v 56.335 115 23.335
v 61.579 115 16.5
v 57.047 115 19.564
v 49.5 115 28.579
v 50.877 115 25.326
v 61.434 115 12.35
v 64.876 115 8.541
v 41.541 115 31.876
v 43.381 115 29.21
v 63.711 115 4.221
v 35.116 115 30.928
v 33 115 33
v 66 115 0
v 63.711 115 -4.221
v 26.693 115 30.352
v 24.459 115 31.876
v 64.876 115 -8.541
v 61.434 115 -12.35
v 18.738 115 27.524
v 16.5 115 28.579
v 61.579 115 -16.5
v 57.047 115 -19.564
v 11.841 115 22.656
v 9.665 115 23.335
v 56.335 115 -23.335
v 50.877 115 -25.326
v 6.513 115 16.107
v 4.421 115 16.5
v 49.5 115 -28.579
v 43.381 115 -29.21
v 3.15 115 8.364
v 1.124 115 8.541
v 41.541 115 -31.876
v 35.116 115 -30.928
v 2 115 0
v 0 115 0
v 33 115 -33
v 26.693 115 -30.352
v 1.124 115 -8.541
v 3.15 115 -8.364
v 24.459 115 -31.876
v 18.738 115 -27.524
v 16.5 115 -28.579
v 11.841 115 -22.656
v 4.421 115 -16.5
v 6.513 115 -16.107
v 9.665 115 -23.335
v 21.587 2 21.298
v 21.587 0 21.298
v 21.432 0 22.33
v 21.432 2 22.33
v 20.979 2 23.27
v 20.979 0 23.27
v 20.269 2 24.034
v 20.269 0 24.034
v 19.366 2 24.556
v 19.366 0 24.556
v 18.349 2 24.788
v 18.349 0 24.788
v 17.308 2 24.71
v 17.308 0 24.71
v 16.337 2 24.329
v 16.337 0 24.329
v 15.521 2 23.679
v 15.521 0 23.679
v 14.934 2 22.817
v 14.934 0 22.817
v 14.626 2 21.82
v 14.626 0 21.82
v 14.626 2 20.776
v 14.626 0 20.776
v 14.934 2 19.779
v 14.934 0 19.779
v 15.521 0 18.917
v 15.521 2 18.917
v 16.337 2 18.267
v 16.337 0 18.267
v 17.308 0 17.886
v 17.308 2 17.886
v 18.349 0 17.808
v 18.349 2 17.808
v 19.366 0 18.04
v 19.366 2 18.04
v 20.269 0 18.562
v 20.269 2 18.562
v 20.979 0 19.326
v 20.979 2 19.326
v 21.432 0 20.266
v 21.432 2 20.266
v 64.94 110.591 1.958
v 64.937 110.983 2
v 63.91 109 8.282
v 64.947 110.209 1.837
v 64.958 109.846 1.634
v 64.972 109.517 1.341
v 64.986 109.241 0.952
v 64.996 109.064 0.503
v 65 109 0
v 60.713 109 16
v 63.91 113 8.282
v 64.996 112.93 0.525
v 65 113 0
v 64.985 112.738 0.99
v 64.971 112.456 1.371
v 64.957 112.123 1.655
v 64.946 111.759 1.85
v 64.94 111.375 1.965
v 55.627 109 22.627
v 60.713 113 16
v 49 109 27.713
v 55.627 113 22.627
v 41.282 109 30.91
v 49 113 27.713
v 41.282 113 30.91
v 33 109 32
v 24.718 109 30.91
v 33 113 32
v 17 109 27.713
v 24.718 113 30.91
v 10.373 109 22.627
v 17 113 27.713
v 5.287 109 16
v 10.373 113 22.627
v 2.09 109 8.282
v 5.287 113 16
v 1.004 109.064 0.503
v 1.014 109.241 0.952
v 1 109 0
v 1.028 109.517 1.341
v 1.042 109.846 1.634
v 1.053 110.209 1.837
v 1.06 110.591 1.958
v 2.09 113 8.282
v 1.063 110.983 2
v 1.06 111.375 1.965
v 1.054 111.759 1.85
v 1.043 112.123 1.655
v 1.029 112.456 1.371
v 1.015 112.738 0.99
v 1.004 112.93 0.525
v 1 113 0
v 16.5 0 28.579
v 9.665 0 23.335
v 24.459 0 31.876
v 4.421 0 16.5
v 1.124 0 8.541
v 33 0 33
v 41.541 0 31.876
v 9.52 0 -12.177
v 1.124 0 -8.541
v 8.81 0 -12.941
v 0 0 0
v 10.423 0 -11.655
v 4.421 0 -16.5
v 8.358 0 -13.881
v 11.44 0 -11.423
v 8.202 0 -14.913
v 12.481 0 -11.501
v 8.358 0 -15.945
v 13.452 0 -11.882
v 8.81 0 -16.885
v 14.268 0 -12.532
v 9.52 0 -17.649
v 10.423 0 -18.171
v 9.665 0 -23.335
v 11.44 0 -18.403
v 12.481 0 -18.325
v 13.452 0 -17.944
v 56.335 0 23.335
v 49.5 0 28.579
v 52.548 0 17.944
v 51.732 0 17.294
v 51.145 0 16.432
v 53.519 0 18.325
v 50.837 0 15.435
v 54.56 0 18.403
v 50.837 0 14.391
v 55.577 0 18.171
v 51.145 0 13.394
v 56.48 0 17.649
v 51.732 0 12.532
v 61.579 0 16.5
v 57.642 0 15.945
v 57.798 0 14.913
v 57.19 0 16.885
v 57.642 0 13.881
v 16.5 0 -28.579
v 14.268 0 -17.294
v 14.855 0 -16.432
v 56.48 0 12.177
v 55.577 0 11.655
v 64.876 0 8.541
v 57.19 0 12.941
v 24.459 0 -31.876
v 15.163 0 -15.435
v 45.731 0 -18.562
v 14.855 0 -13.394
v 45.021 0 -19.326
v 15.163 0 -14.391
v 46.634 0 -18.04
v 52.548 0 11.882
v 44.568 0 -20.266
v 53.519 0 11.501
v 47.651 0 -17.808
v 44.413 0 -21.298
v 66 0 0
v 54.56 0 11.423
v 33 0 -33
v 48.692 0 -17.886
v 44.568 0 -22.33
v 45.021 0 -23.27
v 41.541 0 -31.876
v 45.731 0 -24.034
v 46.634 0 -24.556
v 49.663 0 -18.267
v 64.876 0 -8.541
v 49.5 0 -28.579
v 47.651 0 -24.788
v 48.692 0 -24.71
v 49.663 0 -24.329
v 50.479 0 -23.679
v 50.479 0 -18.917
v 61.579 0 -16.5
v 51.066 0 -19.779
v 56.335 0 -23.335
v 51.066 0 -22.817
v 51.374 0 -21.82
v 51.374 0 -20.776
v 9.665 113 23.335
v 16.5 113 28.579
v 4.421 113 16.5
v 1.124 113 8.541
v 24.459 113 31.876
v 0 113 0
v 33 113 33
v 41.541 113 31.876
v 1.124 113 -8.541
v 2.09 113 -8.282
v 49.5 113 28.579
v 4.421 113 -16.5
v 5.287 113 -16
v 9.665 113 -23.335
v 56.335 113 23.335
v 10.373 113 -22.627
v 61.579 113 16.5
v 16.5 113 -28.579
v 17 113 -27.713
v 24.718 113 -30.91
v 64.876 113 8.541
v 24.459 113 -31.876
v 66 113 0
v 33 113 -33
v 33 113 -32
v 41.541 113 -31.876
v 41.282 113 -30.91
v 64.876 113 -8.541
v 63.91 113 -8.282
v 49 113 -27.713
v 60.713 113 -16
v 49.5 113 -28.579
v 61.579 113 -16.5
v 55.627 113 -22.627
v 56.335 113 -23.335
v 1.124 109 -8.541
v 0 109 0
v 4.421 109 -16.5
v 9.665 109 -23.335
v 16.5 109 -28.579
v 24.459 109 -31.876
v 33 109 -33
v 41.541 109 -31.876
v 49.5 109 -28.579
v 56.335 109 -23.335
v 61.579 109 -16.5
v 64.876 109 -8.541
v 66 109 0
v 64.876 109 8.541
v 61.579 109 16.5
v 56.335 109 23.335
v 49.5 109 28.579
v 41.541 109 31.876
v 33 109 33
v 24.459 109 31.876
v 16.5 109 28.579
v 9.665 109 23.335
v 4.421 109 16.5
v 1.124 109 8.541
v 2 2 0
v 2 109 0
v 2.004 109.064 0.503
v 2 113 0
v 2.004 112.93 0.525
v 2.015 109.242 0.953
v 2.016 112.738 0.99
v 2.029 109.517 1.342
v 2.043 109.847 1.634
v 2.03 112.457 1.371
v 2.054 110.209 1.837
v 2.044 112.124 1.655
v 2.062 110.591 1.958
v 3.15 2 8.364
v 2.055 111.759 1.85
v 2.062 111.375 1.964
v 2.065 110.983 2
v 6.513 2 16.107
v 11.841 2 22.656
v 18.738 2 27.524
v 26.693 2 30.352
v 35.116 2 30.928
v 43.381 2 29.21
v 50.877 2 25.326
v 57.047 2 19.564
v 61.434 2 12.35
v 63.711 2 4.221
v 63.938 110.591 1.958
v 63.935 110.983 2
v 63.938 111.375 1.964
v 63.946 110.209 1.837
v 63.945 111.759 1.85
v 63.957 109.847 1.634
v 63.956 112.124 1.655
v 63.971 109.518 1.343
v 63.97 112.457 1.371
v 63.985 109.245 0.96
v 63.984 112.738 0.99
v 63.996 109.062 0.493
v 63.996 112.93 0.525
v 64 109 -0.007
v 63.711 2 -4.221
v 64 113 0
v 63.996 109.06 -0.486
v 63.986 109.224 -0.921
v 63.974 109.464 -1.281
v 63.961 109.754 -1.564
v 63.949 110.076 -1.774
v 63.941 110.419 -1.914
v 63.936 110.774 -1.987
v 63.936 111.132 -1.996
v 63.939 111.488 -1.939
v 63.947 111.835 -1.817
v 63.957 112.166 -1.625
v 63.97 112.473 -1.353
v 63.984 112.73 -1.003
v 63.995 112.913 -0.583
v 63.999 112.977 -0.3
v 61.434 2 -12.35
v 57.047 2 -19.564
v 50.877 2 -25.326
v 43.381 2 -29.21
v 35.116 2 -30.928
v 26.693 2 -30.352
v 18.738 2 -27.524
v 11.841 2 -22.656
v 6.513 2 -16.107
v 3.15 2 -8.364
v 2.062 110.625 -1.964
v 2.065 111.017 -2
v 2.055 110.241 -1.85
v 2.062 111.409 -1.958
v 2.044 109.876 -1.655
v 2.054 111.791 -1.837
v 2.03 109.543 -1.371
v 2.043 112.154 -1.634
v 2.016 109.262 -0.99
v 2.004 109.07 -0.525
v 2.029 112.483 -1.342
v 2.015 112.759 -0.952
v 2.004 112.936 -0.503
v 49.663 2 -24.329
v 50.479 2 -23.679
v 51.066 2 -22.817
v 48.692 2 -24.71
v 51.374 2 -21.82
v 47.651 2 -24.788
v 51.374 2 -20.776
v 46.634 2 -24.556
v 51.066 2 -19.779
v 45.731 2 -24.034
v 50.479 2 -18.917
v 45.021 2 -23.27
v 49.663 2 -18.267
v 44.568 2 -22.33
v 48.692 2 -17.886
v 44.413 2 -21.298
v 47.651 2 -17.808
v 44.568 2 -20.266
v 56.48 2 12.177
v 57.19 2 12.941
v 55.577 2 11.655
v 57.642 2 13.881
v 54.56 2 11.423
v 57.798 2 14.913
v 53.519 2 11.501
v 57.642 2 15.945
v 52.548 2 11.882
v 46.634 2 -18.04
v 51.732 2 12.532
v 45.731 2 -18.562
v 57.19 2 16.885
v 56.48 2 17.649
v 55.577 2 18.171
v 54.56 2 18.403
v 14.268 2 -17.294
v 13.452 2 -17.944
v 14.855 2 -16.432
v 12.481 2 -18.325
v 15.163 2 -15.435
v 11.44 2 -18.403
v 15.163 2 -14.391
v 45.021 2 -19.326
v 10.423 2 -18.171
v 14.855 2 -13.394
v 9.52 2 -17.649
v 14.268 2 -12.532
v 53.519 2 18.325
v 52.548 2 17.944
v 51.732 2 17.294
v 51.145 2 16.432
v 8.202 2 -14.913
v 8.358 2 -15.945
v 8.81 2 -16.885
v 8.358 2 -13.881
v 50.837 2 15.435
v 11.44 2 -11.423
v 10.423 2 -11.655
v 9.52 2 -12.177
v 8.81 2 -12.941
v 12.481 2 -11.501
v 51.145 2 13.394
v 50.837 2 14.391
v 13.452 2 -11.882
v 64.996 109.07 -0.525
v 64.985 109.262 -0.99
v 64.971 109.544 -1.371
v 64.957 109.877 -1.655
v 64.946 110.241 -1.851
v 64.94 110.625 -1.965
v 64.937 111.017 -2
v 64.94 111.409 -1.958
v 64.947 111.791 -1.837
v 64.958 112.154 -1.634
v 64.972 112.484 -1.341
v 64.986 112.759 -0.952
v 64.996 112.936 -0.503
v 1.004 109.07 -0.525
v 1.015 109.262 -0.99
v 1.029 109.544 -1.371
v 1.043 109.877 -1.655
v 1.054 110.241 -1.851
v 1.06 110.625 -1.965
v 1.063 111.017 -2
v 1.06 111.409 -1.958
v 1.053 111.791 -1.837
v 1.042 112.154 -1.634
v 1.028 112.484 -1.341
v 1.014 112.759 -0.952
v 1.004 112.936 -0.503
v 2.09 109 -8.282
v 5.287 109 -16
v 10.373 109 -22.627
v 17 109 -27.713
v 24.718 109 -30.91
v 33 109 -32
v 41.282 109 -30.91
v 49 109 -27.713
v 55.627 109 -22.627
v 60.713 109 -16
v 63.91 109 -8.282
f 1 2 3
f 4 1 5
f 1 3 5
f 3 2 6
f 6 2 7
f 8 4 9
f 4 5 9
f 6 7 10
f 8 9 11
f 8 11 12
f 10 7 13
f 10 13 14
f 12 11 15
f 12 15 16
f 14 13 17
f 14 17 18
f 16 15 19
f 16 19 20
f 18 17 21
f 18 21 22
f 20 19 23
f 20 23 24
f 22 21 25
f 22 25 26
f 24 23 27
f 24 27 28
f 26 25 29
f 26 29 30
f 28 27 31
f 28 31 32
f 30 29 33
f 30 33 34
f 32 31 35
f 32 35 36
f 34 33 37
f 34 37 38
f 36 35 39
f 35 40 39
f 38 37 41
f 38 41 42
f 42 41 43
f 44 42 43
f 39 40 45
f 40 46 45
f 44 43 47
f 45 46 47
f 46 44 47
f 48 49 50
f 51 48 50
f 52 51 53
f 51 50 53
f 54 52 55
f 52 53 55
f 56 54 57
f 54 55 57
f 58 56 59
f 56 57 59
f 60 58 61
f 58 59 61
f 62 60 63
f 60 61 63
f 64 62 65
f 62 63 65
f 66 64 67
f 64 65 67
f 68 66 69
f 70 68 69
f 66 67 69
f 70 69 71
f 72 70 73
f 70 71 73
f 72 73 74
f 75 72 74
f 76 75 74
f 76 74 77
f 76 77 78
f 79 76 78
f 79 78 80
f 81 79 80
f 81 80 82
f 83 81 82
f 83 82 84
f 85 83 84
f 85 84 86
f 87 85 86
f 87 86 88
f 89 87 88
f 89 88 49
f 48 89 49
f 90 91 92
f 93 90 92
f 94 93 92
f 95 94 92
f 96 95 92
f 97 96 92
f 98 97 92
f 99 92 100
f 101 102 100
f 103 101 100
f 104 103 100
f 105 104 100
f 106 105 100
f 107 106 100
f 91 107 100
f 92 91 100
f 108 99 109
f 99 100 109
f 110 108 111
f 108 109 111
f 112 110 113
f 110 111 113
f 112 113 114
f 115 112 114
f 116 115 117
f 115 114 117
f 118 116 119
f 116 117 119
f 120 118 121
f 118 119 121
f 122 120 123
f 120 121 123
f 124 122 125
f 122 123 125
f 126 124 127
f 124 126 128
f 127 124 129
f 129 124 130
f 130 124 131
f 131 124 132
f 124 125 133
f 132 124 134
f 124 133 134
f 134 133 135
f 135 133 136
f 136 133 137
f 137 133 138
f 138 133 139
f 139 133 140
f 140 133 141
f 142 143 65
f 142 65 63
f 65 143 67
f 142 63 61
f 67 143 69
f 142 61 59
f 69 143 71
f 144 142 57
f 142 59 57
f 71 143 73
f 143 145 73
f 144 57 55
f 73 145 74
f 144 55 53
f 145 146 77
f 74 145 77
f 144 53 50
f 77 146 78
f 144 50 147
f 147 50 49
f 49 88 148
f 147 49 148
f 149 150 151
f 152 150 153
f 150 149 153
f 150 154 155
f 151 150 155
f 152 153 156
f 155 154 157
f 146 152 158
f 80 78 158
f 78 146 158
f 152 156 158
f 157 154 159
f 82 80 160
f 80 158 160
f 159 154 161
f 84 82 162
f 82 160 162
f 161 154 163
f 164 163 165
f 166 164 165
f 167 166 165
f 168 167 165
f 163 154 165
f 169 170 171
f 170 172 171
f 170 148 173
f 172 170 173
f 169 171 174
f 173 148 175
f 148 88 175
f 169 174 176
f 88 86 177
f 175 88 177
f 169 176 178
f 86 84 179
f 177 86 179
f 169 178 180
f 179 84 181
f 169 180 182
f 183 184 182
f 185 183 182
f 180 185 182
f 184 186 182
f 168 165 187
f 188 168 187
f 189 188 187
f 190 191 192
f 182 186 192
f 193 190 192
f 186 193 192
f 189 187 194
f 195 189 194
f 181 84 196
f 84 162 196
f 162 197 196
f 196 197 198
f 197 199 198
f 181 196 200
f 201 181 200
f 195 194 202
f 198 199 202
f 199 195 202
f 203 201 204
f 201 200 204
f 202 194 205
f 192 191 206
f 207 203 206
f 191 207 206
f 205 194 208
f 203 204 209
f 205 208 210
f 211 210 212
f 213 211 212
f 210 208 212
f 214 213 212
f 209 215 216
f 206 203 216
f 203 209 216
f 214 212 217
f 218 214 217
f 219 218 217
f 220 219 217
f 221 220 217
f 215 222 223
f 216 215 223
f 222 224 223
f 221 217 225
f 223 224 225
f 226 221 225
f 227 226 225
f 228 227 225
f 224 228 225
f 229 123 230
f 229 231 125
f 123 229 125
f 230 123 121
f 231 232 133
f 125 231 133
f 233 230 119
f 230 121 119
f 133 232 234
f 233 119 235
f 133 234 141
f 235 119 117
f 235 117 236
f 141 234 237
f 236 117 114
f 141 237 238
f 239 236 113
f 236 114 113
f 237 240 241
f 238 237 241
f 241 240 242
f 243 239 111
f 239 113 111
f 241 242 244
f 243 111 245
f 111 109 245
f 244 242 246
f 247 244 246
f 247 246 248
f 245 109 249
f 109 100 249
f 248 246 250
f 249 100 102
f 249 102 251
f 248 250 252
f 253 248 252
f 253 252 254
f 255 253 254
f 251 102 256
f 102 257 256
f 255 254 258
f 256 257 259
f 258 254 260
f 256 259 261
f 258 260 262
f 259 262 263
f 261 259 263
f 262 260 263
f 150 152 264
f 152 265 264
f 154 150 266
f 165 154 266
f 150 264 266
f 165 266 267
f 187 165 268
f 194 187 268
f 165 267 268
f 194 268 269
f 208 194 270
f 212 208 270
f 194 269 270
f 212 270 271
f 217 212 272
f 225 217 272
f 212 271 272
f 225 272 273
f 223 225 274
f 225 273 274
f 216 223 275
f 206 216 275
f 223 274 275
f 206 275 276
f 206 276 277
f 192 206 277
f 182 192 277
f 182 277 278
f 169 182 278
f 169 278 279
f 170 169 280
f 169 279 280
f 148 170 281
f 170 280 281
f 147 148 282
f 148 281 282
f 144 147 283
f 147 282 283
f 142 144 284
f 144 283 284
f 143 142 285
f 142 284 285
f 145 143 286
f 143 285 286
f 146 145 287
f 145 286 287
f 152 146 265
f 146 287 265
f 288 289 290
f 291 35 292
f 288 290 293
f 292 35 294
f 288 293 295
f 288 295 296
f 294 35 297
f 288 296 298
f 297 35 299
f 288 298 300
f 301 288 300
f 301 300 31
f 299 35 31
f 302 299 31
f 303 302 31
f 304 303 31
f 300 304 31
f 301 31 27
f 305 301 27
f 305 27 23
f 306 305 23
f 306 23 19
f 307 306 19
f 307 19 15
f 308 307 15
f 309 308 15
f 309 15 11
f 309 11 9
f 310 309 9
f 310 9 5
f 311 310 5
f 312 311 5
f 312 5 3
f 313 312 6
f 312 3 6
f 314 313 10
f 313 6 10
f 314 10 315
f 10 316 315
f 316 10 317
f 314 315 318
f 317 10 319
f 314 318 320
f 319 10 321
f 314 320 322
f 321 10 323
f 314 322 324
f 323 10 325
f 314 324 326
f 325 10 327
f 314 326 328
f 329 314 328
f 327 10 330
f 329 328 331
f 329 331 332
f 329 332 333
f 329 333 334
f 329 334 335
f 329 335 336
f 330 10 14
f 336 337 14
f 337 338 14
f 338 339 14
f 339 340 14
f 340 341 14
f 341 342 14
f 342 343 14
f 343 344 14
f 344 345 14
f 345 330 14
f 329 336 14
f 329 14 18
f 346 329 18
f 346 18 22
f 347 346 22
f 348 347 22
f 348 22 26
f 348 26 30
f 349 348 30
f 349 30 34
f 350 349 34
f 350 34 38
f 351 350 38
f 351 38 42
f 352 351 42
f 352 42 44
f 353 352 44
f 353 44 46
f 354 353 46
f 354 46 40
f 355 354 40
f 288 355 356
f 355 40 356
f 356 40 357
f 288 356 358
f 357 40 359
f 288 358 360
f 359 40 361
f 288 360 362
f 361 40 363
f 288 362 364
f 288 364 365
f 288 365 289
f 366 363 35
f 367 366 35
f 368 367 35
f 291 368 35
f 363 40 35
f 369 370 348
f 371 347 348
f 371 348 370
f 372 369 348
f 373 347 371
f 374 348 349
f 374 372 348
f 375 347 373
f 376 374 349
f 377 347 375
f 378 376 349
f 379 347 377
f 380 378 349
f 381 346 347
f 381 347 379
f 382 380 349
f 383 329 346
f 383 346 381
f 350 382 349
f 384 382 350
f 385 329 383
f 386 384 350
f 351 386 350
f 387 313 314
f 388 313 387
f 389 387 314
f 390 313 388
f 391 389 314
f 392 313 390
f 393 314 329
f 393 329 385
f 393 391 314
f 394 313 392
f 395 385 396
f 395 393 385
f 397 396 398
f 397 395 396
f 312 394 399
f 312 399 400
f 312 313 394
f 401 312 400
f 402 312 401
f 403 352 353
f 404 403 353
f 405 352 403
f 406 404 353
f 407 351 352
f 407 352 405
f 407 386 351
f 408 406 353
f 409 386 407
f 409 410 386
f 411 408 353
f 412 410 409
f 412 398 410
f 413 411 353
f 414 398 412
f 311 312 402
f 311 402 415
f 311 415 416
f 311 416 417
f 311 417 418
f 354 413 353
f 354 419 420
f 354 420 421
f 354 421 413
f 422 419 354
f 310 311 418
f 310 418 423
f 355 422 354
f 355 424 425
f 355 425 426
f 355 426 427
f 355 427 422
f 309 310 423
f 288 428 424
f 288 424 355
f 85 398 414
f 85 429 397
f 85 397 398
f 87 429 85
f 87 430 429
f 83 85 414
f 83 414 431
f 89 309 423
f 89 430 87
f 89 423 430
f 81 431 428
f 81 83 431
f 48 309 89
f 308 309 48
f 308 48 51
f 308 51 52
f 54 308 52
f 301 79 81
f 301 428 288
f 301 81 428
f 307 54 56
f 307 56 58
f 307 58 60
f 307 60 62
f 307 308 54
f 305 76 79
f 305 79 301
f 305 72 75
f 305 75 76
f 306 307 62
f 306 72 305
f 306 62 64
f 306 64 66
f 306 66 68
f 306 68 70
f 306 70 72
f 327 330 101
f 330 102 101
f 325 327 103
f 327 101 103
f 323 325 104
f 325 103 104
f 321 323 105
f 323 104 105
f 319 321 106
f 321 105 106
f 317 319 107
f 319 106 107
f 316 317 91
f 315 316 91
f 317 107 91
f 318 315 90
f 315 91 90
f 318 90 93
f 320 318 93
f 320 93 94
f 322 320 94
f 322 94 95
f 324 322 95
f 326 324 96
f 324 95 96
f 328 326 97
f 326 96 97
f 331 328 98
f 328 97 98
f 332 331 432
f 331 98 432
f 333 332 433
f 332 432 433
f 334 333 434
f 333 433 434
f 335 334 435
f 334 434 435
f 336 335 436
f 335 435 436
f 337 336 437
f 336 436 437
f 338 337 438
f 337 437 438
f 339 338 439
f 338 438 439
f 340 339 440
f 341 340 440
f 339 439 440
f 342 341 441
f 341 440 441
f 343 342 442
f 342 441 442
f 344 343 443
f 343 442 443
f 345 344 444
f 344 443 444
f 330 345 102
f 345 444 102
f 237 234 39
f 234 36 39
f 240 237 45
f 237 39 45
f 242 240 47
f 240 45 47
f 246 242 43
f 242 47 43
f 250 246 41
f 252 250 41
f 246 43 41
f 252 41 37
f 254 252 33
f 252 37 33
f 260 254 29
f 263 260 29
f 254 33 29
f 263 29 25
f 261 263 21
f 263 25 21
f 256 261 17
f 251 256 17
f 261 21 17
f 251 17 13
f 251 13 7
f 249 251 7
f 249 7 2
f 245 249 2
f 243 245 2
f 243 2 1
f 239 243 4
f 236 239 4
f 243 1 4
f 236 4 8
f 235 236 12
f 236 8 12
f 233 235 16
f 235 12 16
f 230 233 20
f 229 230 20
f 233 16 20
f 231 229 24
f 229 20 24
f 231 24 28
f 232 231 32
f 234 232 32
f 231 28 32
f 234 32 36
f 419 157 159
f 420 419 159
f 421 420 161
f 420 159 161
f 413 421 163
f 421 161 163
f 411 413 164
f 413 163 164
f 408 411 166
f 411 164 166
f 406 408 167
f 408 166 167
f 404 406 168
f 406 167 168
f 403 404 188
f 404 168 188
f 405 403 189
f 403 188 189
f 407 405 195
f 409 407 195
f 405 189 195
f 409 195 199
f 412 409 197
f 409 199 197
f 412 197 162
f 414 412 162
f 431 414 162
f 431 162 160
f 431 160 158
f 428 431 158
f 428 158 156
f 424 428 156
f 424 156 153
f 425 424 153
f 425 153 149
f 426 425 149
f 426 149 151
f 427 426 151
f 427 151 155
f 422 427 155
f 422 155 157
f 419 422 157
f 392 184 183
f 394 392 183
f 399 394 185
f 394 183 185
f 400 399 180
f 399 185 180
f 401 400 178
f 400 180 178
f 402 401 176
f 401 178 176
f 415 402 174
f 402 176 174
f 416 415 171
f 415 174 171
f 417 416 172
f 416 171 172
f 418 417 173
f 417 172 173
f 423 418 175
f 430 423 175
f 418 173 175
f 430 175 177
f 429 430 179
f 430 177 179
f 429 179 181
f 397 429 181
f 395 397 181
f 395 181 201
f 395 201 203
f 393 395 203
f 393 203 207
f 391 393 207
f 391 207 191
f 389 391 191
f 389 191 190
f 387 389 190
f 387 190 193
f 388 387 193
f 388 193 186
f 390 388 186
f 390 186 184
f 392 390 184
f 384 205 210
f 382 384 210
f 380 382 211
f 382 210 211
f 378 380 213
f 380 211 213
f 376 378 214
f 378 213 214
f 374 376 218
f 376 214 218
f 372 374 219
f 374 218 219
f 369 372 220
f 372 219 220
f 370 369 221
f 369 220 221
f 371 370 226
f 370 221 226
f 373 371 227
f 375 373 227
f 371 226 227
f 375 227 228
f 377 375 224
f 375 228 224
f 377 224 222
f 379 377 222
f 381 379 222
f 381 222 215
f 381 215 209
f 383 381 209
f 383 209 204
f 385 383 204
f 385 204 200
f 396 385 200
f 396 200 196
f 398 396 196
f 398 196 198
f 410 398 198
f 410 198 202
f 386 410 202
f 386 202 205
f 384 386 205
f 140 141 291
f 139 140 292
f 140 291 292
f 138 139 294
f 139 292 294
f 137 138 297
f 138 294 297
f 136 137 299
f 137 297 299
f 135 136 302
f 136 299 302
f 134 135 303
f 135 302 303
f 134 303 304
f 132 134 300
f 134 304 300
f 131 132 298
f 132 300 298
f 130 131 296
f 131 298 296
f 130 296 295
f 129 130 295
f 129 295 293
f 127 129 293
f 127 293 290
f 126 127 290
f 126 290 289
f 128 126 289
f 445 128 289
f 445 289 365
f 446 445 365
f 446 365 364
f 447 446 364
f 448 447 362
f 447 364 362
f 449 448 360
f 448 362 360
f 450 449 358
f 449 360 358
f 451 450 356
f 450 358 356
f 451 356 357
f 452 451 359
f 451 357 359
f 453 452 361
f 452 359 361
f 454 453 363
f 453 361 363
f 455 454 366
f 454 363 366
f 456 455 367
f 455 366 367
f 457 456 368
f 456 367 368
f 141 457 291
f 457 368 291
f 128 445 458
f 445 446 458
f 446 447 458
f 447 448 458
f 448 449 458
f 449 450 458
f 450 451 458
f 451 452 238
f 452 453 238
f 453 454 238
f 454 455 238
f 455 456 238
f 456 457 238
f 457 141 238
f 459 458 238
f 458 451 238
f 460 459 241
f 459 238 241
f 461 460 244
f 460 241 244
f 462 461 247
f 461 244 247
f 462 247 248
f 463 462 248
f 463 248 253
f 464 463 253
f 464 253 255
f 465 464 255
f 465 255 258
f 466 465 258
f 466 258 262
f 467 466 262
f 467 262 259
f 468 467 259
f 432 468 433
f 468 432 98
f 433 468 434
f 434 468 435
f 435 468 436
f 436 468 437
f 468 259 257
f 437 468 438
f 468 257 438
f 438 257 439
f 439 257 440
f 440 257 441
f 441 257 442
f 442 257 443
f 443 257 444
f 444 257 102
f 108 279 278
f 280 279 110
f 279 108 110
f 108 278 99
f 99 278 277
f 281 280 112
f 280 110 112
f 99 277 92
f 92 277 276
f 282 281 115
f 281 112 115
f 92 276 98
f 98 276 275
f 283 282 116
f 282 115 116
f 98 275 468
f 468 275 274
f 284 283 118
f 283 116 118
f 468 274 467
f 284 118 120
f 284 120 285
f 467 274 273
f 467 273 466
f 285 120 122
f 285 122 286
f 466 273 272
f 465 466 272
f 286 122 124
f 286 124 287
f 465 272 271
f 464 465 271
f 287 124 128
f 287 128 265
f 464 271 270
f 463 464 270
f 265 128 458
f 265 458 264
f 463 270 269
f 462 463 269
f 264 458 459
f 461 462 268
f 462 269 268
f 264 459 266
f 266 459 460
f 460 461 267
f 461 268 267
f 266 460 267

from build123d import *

# Parameters (mm, degrees)
ESQUISSE3_R             = 31
ENL_V_MAT_EXTRU_2_DEPTH = 113
ESQUISSE4_R             = 2
ENL_V_MAT_EXTRU_3_DEPTH = 64
ESQUISSE6_R             = 3.5
ENL_V_MAT_EXTRU_5_DEPTH = 10


with BuildPart() as part:
    # Esquisse1 → Révolution1 (revolve)
    with BuildSketch(Plane.XY):
        Polygon((0, 0), (0, 109), (1, 109), (1, 113), (0, 113), (0, 115), (33, 115), (33, 0), align=None)
    revolve(axis=Axis((33, 183.335721317, 0), (0, -1, 0)))

    # Esquisse3 → Enlèv. mat.-Extru.2 (cut)
    with BuildSketch(Plane(origin=(0, 115, 0), x_dir=(1, 0, 0), z_dir=(0, 1, 0))):
        with Locations(Location((33, 0, 0), (0, 0, 180))):
            Circle(ESQUISSE3_R)
    extrude(amount=-ENL_V_MAT_EXTRU_2_DEPTH, mode=Mode.SUBTRACT)

    # Esquisse4 → Enlèv. mat.-Extru.3 (cut)
    with BuildSketch(Plane(origin=(65, 0, 0), x_dir=(0, 0, -1), z_dir=(1, 0, 0))):
        with Locations(Location((0, 111, 0), (0, 0, 90))):
            Circle(ESQUISSE4_R)
    extrude(amount=-ENL_V_MAT_EXTRU_3_DEPTH, mode=Mode.SUBTRACT)

    # Esquisse6 → Enlèv. mat.-Extru.5 (cut)
    with BuildSketch(Plane.XZ):
        with Locations((54.297953152, 14.912987345)):
            Circle(ESQUISSE6_R)
        with Locations((18.087012655, 21.297953152)):
            Circle(ESQUISSE6_R)
        with Locations(Location((11.702046848, -14.912987345, 0), (0, 0, 180))):
            Circle(ESQUISSE6_R)
        with Locations(Location((47.912987345, -21.297953152, 0), (0, 0, 180))):
            Circle(ESQUISSE6_R)
    extrude(amount=-ENL_V_MAT_EXTRU_5_DEPTH, mode=Mode.SUBTRACT)


solid = part.part
